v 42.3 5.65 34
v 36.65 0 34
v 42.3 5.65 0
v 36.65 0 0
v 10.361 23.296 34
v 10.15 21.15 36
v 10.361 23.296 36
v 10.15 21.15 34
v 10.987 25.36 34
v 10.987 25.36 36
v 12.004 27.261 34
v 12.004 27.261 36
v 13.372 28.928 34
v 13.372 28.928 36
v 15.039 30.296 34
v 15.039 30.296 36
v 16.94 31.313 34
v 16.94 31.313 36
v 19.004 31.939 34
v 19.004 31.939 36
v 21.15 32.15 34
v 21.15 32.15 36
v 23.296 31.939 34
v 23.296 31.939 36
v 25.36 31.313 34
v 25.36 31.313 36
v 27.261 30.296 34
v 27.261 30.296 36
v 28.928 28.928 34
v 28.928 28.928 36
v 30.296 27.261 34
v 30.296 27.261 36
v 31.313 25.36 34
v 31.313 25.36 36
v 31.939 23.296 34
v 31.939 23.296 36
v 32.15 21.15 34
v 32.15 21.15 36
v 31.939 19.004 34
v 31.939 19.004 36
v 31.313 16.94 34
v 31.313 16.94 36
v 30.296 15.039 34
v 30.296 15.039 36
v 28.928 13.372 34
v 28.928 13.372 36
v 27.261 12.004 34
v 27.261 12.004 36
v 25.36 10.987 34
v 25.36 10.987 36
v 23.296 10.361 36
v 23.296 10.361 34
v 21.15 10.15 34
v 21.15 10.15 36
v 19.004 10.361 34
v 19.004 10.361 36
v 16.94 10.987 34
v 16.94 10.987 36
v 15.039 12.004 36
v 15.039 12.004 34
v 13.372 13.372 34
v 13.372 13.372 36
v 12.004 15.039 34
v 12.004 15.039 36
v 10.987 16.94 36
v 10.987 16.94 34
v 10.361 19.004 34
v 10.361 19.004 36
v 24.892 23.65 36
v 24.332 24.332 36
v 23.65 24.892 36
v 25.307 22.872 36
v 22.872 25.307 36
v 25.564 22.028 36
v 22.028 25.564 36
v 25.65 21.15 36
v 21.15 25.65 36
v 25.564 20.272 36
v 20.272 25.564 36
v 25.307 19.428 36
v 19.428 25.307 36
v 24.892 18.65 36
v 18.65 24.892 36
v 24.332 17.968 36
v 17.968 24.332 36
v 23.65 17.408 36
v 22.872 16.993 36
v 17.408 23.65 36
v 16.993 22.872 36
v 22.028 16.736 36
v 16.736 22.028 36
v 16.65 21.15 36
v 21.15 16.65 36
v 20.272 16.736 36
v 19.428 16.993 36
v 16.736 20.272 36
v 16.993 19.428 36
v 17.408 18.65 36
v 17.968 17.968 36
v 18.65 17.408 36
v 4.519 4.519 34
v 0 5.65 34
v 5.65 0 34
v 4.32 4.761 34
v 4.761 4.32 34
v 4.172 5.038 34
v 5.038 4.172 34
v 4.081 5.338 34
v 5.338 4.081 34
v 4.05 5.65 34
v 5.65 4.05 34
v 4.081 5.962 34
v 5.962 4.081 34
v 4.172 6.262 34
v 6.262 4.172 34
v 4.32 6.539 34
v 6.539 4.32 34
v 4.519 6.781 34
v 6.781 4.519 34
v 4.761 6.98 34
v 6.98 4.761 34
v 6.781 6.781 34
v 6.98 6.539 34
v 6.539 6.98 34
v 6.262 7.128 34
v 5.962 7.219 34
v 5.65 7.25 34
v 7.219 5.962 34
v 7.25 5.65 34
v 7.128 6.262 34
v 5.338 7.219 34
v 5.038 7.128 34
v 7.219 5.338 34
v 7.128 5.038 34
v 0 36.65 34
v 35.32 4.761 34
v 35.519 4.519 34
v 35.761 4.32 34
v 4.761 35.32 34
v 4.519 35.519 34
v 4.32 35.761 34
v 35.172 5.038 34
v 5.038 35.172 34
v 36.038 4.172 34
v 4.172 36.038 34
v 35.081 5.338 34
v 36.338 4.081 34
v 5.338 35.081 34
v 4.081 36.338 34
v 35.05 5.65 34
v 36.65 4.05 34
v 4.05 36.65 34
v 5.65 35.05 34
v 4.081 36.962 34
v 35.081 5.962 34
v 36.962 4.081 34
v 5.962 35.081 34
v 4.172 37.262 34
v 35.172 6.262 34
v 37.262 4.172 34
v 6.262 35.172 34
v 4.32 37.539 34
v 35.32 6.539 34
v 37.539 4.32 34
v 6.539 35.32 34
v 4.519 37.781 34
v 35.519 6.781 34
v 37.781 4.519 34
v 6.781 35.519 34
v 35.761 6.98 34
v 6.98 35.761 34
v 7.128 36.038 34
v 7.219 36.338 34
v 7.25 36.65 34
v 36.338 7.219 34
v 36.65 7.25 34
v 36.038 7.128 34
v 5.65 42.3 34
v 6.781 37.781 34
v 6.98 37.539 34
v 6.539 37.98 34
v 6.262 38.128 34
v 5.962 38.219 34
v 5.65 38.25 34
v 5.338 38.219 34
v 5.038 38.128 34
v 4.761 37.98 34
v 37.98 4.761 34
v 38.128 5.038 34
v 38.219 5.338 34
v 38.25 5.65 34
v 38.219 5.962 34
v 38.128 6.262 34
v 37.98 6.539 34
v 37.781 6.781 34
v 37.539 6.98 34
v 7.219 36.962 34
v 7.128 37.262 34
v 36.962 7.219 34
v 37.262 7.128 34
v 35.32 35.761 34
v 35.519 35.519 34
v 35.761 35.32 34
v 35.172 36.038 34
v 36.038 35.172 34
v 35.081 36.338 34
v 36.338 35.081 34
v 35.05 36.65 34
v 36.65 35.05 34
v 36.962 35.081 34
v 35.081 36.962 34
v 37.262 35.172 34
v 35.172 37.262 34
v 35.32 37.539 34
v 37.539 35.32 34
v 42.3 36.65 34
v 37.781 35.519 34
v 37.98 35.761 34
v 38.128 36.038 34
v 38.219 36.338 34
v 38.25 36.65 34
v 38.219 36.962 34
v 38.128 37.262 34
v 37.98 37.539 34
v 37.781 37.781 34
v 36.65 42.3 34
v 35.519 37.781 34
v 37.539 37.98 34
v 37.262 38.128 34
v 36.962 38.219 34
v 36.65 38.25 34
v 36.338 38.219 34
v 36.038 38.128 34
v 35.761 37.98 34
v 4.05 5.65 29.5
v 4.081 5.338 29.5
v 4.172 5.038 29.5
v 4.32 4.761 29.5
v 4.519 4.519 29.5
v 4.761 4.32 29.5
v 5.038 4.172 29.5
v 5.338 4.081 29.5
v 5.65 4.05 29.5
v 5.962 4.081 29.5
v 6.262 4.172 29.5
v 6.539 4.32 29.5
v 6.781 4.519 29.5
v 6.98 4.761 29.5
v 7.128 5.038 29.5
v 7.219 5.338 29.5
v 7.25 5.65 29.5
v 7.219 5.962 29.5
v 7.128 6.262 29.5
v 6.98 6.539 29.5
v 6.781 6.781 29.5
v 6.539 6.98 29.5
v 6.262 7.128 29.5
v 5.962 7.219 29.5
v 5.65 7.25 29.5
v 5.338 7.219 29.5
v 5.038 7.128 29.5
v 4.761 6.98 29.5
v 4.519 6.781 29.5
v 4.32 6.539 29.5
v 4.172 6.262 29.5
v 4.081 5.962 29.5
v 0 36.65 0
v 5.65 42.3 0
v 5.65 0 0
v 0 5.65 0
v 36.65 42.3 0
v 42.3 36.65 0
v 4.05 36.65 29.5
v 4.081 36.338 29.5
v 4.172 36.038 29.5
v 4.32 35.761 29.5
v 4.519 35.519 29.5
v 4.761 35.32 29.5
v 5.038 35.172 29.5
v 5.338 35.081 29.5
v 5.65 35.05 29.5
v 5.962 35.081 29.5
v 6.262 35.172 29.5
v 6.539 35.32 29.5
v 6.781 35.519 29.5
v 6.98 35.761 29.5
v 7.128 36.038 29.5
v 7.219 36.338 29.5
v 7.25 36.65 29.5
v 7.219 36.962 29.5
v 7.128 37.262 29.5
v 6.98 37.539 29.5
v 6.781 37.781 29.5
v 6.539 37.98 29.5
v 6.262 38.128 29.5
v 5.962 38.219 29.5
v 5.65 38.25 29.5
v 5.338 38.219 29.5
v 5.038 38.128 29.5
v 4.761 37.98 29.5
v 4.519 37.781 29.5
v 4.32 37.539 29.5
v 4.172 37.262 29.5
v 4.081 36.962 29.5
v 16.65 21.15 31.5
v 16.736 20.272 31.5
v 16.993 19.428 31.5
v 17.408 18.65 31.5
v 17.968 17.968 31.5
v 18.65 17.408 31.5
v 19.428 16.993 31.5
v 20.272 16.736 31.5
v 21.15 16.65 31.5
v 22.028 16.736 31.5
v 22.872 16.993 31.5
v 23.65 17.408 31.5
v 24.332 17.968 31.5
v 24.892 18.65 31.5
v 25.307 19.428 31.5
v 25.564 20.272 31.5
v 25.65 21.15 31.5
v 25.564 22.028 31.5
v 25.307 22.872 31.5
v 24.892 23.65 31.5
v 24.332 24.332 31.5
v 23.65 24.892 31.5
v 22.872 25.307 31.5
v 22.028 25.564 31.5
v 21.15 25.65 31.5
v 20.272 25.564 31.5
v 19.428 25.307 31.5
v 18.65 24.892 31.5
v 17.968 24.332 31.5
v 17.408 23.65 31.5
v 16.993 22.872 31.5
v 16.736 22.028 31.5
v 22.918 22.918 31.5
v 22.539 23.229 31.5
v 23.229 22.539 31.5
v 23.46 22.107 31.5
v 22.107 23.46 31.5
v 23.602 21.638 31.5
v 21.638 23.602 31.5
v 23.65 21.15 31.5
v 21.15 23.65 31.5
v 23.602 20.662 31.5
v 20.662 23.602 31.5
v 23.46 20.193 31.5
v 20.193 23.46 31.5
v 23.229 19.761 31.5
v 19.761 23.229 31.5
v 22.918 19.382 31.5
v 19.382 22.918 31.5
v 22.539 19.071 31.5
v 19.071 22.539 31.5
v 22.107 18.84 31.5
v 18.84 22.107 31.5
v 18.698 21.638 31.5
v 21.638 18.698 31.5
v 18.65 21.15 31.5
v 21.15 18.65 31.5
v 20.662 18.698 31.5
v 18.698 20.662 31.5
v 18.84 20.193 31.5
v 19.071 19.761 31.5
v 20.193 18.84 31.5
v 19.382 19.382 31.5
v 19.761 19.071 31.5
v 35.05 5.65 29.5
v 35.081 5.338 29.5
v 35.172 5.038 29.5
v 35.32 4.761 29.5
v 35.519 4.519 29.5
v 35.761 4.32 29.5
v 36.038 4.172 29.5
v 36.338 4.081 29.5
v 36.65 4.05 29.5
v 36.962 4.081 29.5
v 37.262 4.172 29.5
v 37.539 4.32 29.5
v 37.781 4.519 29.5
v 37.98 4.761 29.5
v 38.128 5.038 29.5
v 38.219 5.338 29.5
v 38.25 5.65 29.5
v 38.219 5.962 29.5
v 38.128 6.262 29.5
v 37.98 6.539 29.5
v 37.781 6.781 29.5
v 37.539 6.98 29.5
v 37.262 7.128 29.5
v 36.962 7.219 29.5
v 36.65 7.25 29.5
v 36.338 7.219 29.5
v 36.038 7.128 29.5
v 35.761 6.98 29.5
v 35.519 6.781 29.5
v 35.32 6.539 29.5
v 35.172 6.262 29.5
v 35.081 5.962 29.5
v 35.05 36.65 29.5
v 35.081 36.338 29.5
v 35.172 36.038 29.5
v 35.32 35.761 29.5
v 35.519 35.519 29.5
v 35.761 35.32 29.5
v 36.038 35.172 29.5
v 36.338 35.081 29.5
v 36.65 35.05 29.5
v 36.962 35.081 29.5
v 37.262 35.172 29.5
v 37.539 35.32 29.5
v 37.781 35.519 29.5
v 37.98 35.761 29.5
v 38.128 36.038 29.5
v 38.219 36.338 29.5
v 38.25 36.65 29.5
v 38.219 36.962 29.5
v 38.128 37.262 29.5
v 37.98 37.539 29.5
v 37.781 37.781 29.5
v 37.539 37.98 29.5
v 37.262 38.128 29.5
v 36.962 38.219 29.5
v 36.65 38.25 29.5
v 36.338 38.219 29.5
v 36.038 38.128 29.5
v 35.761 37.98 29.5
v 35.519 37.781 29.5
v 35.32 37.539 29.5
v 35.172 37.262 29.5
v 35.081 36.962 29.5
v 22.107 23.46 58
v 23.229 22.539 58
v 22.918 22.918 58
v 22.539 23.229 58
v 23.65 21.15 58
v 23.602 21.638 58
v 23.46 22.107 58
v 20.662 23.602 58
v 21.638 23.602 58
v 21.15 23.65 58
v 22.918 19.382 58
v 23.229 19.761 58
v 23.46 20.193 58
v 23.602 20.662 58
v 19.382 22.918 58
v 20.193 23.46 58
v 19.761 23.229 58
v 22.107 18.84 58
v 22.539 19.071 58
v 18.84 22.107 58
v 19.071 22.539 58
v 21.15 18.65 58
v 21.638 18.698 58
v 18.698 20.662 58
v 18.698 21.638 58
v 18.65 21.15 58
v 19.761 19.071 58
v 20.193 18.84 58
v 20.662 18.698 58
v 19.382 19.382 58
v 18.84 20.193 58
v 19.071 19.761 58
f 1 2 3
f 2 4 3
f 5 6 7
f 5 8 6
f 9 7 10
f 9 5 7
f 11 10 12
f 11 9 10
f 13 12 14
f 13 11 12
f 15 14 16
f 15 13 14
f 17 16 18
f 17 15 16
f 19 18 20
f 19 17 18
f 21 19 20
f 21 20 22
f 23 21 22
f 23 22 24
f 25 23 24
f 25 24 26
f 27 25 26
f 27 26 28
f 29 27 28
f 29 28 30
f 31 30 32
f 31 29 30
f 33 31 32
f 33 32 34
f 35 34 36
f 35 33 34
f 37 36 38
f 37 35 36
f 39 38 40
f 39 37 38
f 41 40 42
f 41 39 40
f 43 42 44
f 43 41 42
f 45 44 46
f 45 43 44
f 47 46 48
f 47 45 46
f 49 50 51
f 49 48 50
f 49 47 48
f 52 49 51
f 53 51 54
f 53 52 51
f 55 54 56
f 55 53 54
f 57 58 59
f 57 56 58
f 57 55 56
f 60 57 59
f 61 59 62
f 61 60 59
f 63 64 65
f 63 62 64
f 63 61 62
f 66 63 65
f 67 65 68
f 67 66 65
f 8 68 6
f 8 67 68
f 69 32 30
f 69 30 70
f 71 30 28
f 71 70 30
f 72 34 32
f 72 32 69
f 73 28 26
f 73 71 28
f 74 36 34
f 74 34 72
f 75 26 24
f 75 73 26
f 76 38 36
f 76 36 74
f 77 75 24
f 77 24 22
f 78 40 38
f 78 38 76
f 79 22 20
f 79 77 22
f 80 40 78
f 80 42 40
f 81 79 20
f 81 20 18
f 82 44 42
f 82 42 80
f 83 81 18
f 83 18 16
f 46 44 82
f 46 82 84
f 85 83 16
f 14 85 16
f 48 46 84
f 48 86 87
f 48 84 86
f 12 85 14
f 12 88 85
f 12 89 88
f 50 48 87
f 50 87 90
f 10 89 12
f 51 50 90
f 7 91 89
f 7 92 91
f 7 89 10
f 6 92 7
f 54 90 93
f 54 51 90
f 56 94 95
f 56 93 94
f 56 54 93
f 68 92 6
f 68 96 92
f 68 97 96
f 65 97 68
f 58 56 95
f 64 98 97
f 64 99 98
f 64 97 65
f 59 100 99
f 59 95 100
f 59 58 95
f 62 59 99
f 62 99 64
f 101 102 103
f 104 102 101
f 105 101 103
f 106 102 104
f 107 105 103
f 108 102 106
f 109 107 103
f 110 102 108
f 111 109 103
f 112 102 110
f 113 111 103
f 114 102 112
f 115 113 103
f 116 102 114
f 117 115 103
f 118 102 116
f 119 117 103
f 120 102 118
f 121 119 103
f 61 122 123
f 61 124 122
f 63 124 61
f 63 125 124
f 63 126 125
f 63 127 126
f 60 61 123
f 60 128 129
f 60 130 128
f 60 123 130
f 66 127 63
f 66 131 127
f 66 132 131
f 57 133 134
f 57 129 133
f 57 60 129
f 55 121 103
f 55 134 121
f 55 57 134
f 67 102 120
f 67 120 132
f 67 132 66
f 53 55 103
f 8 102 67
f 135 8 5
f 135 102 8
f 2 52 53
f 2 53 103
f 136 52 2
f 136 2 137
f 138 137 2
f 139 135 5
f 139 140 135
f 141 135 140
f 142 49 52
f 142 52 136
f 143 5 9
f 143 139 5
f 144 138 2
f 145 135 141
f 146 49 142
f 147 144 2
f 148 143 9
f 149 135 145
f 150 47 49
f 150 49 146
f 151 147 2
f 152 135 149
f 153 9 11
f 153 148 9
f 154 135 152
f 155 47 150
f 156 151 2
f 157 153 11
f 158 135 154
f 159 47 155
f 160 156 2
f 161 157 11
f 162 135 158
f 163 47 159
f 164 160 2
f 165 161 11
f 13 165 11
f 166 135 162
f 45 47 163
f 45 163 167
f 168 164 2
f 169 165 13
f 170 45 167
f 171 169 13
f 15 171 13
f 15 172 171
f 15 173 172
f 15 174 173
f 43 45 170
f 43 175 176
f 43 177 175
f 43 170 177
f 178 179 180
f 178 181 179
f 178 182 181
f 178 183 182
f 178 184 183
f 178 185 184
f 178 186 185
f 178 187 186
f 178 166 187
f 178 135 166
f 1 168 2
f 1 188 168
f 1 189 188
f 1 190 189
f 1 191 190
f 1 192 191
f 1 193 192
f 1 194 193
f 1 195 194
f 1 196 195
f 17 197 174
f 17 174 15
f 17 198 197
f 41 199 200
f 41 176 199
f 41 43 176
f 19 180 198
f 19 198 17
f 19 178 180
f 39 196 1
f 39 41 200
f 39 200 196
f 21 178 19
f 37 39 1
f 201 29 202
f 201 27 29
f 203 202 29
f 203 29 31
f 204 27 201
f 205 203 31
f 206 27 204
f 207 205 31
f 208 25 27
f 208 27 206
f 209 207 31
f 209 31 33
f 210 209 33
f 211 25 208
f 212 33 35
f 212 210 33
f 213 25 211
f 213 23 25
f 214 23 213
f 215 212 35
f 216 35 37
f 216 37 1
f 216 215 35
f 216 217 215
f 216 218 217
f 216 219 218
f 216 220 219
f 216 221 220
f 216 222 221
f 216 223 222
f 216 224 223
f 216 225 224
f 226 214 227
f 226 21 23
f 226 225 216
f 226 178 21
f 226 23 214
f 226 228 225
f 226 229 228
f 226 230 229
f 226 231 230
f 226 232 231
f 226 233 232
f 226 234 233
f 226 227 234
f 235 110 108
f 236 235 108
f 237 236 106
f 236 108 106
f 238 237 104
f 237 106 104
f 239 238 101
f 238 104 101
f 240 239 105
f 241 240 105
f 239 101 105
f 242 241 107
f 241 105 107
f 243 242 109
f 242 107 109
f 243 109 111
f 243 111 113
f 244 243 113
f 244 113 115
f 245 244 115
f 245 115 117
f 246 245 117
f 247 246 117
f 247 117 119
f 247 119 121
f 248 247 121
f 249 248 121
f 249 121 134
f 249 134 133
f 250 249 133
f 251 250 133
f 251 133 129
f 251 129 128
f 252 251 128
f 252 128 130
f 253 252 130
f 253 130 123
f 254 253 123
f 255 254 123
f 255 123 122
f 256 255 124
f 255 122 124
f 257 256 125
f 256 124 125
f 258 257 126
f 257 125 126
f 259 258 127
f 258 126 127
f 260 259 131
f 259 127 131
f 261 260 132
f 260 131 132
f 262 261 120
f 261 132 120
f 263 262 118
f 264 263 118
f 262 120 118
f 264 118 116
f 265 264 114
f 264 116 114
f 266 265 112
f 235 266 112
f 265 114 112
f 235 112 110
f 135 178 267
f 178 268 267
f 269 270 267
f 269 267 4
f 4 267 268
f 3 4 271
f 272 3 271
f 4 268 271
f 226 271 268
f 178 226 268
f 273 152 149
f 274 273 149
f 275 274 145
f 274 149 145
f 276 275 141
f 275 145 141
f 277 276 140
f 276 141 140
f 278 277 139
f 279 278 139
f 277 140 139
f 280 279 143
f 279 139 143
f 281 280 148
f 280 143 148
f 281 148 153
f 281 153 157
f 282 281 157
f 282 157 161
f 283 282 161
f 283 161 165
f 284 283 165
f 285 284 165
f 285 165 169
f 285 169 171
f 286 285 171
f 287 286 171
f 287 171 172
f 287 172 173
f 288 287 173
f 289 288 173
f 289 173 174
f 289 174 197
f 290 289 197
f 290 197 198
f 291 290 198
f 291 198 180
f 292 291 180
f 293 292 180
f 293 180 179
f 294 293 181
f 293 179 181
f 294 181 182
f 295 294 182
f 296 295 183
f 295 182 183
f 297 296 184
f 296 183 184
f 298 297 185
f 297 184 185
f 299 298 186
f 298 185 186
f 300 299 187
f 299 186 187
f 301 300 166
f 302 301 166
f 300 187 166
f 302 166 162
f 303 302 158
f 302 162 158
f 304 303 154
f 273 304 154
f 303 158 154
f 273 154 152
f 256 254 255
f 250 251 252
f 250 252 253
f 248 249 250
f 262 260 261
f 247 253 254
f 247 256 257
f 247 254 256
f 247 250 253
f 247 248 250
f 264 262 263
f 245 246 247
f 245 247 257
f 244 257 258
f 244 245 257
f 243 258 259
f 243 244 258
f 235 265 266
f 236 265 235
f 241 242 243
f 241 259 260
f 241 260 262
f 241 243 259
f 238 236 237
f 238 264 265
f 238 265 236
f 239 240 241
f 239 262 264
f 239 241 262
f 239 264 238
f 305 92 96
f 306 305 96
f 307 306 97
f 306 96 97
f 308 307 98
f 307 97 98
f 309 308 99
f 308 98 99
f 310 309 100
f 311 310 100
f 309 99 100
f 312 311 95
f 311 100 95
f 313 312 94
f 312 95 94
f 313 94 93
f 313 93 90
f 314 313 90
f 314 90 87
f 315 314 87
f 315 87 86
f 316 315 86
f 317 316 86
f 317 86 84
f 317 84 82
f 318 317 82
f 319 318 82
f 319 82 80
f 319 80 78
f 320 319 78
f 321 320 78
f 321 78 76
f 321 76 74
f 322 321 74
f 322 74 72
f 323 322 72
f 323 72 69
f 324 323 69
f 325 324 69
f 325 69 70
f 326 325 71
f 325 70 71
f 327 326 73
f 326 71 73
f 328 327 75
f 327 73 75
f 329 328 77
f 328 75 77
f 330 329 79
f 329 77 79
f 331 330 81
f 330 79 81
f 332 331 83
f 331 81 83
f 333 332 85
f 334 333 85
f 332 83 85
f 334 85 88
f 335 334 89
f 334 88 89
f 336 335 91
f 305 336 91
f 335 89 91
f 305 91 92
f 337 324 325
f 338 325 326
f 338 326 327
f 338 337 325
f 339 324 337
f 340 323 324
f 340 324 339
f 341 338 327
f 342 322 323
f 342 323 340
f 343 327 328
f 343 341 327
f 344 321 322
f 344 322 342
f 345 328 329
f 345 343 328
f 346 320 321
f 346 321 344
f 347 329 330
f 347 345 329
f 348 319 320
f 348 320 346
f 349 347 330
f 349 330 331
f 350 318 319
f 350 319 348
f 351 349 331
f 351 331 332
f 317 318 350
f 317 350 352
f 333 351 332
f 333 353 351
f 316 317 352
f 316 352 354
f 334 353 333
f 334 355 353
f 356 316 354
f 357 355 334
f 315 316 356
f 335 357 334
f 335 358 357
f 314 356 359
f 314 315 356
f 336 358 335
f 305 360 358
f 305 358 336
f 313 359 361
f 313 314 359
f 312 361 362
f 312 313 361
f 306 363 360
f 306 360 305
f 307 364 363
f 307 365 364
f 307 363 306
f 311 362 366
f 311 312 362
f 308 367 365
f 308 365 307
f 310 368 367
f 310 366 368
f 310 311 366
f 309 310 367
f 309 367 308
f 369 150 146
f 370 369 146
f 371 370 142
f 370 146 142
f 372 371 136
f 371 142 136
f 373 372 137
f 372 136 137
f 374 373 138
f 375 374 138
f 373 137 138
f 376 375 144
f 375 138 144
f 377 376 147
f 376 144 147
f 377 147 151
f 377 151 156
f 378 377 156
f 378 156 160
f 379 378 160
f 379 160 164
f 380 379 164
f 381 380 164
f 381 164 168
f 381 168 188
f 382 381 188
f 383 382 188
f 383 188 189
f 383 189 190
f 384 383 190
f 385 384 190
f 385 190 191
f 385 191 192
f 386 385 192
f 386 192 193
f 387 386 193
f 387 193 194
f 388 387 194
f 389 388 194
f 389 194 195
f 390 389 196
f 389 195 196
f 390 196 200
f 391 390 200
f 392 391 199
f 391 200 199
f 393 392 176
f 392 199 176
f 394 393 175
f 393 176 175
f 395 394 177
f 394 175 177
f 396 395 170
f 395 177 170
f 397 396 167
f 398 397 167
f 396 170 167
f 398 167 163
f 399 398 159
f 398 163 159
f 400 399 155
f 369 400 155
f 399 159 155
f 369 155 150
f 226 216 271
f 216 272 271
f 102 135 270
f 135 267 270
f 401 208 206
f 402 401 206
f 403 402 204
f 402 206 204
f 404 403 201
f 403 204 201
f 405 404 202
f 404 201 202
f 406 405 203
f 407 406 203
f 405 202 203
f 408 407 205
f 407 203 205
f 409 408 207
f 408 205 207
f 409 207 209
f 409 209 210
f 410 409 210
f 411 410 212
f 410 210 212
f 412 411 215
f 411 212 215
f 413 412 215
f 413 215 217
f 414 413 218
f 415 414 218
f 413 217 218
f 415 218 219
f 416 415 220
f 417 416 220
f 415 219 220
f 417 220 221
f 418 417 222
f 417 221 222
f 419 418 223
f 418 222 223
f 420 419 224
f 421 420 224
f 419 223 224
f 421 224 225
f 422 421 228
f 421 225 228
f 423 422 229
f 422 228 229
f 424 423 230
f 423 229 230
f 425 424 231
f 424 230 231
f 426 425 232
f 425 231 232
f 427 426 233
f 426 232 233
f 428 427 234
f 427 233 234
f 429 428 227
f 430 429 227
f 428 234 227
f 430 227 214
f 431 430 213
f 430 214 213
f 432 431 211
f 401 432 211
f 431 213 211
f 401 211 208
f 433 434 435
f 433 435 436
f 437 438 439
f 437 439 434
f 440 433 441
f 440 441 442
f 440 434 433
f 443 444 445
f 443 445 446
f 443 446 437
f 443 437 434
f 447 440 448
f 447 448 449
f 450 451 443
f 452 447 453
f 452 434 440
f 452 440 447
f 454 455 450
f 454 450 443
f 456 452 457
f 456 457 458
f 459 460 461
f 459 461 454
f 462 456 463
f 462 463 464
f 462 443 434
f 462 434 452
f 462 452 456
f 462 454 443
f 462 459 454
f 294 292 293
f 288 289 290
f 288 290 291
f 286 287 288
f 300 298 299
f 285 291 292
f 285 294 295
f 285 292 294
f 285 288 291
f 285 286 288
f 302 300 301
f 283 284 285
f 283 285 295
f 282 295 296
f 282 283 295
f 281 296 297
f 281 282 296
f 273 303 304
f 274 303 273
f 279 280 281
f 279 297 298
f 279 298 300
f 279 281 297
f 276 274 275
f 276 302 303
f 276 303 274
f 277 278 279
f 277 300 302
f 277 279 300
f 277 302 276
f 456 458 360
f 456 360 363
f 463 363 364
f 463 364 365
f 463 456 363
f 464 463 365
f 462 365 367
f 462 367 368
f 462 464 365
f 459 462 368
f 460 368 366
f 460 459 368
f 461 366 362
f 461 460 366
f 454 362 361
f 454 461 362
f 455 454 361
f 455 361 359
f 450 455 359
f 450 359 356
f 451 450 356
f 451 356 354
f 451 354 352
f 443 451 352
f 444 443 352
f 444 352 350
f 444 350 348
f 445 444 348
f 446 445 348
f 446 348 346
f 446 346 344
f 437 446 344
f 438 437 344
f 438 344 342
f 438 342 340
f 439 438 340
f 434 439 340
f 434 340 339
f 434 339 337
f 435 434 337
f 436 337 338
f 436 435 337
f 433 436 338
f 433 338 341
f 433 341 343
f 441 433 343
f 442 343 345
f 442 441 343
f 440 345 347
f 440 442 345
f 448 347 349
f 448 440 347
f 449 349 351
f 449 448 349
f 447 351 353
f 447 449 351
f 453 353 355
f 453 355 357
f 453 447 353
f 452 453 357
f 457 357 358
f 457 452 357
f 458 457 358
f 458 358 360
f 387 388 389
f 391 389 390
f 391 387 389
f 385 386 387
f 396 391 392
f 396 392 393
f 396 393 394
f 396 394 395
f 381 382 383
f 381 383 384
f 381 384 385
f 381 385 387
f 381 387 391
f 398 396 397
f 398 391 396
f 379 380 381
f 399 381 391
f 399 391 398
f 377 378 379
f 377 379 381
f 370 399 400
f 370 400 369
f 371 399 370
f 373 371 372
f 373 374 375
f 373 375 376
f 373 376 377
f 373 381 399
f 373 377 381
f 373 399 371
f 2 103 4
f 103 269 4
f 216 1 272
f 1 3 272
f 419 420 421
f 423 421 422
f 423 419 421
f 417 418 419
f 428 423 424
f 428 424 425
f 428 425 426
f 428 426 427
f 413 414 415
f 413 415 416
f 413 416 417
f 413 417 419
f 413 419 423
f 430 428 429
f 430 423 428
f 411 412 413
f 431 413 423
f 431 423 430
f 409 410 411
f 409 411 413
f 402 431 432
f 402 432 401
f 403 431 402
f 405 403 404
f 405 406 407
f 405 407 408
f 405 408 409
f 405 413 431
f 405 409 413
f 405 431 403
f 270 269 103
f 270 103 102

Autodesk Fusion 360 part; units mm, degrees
sketch "Sketch1" plane through (0, 0, 0) normal (0, 0, 1) x (1, 0, 0)
  line L0 (5.65, 0) -> (36.65, 0)
  line L1 (42.3, 5.65) -> (42.3, 36.65)
  line L2 (36.65, 42.3) -> (5.65, 42.3)
  line L3 (0, 36.65) -> (0, 5.65)
  line L4 (42.3, 36.65) -> (36.65, 42.3)
  line L5 (5.65, 42.3) -> (0, 36.65)
  line L6 (36.65, 0) -> (42.3, 5.65)
  line L7 (5.65, 0) -> (0, 5.65)
  dimension "d3" = 5.65
  dimension "d4" = 5.65
  dimension "d9" = 5.65
extrude "Extrude1" add sketch "Sketch1" along normal blind 34
sketch "Sketch2" plane through (0, 0, 34) normal (0, 0, 1) x (-1, 0, 0)
  line L0 (-36.65, 0) -> (-42.3, -5.65)
  line L1 (-42.3, -5.65) -> (-42.3, -36.65)
  line L2 (-42.3, -36.65) -> (-36.65, -42.3)
  line L3 (-36.65, -42.3) -> (-5.65, -42.3)
  line L4 (-5.65, -42.3) -> (0, -36.65)
  line L5 (0, -36.65) -> (0, -5.65)
  line L6 (0, -5.65) -> (-5.65, 0)
  line L7 (-5.65, 0) -> (-36.65, 0)
  circle A0 centre (-21.15, -21.15) radius 11
  circle A1 centre (-5.65, -36.65) radius 1.6
  circle A2 centre (-36.65, -36.65) radius 1.6
  dimension "d12" = 22
  dimension "d13" = 3.2
  dimension "d14" = 3.2
  dimension "d15" = 5.65
  dimension "d16" = 5.65
  dimension "d17" = 5.65
  dimension "d18" = 5.65
  dimension "d19" = 21.15
  dimension "d20" = 21.15
extrude "Extrude3" cut sketch "Sketch2" against normal blind 4.5 contours A1 | A2
extrude "Extrude2" add sketch "Sketch2" along normal blind 2 contours A0
pattern_linear "R-Pattern1" count 2 spacing 31 along (0, -1, 0) of "Extrude3"
sketch "Sketch3" plane through (0, 0, 36) normal (0, 0, 1) x (-1, 0, 0)
  circle A0 centre (-21.15, -21.15) radius 11
  circle A1 centre (-21.15, -21.15) radius 2.5
  dimension "d29" = 5
extrude "Extrude4" add sketch "Sketch3" along normal blind 22 contours A1
sketch "Sketch4" plane through (0, 0, 36) normal (0, 0, 1) x (-1, 0, 0)
  circle A0 centre (-21.15, -21.15) radius 2.5
  circle A1 centre (-21.15, -21.15) radius 11
  circle A2 centre (-21.15, -21.15) radius 4.5
  dimension "d32" = 9
extrude "Extrude5" cut sketch "Sketch4" against normal blind 4.5 contours A2
equation "d3 = ( 11.3 / 2 ) * 1 mm"
